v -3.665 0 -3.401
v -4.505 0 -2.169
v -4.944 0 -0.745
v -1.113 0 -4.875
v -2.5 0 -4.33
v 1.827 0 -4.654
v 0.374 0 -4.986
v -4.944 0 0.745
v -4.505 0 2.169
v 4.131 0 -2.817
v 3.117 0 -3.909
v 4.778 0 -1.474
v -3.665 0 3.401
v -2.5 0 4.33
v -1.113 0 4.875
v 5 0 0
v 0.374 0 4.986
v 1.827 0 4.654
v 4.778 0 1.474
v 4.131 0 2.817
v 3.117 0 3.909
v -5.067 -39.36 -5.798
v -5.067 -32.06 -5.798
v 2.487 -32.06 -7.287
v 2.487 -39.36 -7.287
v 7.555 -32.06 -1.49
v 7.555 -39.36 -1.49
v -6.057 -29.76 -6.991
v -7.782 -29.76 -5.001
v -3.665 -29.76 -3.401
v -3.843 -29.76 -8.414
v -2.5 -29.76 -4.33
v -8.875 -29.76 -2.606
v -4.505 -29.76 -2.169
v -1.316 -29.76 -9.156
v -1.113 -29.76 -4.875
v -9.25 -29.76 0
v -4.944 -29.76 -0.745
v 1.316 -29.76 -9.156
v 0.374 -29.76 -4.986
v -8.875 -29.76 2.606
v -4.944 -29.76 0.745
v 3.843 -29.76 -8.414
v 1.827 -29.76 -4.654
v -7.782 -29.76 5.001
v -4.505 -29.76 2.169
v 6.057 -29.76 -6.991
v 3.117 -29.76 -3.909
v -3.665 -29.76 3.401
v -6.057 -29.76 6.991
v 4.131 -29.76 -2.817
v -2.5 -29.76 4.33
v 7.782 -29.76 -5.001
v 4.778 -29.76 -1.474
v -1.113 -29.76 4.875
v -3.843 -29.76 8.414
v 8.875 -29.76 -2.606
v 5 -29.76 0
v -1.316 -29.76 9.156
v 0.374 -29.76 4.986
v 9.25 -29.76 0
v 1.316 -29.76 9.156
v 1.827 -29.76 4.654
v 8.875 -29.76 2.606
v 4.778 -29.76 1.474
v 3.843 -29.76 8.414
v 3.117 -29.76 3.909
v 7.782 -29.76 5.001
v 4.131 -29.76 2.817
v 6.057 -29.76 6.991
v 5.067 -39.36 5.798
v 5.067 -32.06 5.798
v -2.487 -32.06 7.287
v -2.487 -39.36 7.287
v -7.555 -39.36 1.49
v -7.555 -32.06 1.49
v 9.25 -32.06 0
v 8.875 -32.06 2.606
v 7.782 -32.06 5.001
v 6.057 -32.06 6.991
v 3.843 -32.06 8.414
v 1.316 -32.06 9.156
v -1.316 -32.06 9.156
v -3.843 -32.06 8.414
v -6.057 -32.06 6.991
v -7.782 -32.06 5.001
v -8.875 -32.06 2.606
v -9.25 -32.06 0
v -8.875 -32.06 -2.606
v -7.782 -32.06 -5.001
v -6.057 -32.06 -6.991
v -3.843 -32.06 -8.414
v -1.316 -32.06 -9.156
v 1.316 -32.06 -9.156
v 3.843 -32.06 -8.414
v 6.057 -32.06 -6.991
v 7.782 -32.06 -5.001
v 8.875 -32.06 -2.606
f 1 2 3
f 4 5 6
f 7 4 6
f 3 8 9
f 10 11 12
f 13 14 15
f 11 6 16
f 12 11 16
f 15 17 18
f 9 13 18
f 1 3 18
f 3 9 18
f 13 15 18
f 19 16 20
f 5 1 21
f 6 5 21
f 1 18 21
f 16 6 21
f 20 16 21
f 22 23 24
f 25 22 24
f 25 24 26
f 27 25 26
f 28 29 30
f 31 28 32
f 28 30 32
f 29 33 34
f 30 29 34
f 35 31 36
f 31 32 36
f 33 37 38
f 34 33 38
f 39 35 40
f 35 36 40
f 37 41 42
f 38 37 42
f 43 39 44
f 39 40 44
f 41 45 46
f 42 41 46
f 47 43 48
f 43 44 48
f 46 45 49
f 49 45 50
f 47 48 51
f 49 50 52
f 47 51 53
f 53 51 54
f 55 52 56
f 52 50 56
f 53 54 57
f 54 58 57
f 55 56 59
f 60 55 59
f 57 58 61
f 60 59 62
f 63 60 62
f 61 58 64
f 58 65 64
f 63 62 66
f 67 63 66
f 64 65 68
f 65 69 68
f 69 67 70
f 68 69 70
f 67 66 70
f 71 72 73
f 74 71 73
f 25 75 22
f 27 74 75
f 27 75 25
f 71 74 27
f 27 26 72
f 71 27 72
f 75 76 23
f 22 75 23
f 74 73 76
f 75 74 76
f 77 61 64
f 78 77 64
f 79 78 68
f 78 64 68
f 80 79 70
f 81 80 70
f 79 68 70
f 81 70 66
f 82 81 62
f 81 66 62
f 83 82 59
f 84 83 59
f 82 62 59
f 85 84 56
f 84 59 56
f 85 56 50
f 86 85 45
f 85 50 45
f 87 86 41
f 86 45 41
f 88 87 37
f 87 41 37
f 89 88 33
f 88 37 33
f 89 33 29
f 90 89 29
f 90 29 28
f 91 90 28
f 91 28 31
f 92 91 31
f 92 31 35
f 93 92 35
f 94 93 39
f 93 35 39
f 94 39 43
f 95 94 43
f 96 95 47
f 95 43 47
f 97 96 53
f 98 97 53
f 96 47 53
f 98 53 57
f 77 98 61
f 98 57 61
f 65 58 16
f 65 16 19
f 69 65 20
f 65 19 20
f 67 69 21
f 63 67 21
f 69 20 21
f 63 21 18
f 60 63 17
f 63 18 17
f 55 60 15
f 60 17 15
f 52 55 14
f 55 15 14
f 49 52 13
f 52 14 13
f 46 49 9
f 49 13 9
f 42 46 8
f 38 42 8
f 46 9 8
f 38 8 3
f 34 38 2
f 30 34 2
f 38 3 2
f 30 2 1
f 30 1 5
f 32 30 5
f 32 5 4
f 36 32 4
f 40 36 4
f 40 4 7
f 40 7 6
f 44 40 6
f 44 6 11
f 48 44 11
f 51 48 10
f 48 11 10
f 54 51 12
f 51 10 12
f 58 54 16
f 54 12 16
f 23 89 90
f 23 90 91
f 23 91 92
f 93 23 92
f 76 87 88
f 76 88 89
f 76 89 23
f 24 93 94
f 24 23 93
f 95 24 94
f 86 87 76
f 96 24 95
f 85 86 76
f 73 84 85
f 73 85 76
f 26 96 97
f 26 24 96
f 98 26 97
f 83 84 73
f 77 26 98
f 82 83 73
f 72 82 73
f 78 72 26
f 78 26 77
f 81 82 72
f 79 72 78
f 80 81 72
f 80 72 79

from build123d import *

# Parameters (mm, degrees)
F0_R     = 5
F1_DEPTH = 29.76
F3_R     = 9.25
F4_DEPTH = 2.3
F7_DEPTH = 7.3


with BuildPart() as f1:
    # F0 (on Front) → F1 (new body)
    with BuildSketch(Plane.XZ):
        Circle(F0_R)
    extrude(amount=F1_DEPTH)

    # F3 (on offset) → F4 (join)
    with BuildSketch(Plane.XZ.offset(29.76)):
        Circle(F3_R)
    extrude(amount=F4_DEPTH)

    # F6 (on offset) → F7 (join)
    with BuildSketch(Plane.XZ.offset(32.06)):
        Polygon((7.55453, -1.489656), (5.067345, 5.797587), (-2.487185, 7.287243), (-7.55453, 1.489656), (-5.067345, -5.797587), (2.487185, -7.287243), align=None)
    extrude(amount=F7_DEPTH)


solid = f1.part
